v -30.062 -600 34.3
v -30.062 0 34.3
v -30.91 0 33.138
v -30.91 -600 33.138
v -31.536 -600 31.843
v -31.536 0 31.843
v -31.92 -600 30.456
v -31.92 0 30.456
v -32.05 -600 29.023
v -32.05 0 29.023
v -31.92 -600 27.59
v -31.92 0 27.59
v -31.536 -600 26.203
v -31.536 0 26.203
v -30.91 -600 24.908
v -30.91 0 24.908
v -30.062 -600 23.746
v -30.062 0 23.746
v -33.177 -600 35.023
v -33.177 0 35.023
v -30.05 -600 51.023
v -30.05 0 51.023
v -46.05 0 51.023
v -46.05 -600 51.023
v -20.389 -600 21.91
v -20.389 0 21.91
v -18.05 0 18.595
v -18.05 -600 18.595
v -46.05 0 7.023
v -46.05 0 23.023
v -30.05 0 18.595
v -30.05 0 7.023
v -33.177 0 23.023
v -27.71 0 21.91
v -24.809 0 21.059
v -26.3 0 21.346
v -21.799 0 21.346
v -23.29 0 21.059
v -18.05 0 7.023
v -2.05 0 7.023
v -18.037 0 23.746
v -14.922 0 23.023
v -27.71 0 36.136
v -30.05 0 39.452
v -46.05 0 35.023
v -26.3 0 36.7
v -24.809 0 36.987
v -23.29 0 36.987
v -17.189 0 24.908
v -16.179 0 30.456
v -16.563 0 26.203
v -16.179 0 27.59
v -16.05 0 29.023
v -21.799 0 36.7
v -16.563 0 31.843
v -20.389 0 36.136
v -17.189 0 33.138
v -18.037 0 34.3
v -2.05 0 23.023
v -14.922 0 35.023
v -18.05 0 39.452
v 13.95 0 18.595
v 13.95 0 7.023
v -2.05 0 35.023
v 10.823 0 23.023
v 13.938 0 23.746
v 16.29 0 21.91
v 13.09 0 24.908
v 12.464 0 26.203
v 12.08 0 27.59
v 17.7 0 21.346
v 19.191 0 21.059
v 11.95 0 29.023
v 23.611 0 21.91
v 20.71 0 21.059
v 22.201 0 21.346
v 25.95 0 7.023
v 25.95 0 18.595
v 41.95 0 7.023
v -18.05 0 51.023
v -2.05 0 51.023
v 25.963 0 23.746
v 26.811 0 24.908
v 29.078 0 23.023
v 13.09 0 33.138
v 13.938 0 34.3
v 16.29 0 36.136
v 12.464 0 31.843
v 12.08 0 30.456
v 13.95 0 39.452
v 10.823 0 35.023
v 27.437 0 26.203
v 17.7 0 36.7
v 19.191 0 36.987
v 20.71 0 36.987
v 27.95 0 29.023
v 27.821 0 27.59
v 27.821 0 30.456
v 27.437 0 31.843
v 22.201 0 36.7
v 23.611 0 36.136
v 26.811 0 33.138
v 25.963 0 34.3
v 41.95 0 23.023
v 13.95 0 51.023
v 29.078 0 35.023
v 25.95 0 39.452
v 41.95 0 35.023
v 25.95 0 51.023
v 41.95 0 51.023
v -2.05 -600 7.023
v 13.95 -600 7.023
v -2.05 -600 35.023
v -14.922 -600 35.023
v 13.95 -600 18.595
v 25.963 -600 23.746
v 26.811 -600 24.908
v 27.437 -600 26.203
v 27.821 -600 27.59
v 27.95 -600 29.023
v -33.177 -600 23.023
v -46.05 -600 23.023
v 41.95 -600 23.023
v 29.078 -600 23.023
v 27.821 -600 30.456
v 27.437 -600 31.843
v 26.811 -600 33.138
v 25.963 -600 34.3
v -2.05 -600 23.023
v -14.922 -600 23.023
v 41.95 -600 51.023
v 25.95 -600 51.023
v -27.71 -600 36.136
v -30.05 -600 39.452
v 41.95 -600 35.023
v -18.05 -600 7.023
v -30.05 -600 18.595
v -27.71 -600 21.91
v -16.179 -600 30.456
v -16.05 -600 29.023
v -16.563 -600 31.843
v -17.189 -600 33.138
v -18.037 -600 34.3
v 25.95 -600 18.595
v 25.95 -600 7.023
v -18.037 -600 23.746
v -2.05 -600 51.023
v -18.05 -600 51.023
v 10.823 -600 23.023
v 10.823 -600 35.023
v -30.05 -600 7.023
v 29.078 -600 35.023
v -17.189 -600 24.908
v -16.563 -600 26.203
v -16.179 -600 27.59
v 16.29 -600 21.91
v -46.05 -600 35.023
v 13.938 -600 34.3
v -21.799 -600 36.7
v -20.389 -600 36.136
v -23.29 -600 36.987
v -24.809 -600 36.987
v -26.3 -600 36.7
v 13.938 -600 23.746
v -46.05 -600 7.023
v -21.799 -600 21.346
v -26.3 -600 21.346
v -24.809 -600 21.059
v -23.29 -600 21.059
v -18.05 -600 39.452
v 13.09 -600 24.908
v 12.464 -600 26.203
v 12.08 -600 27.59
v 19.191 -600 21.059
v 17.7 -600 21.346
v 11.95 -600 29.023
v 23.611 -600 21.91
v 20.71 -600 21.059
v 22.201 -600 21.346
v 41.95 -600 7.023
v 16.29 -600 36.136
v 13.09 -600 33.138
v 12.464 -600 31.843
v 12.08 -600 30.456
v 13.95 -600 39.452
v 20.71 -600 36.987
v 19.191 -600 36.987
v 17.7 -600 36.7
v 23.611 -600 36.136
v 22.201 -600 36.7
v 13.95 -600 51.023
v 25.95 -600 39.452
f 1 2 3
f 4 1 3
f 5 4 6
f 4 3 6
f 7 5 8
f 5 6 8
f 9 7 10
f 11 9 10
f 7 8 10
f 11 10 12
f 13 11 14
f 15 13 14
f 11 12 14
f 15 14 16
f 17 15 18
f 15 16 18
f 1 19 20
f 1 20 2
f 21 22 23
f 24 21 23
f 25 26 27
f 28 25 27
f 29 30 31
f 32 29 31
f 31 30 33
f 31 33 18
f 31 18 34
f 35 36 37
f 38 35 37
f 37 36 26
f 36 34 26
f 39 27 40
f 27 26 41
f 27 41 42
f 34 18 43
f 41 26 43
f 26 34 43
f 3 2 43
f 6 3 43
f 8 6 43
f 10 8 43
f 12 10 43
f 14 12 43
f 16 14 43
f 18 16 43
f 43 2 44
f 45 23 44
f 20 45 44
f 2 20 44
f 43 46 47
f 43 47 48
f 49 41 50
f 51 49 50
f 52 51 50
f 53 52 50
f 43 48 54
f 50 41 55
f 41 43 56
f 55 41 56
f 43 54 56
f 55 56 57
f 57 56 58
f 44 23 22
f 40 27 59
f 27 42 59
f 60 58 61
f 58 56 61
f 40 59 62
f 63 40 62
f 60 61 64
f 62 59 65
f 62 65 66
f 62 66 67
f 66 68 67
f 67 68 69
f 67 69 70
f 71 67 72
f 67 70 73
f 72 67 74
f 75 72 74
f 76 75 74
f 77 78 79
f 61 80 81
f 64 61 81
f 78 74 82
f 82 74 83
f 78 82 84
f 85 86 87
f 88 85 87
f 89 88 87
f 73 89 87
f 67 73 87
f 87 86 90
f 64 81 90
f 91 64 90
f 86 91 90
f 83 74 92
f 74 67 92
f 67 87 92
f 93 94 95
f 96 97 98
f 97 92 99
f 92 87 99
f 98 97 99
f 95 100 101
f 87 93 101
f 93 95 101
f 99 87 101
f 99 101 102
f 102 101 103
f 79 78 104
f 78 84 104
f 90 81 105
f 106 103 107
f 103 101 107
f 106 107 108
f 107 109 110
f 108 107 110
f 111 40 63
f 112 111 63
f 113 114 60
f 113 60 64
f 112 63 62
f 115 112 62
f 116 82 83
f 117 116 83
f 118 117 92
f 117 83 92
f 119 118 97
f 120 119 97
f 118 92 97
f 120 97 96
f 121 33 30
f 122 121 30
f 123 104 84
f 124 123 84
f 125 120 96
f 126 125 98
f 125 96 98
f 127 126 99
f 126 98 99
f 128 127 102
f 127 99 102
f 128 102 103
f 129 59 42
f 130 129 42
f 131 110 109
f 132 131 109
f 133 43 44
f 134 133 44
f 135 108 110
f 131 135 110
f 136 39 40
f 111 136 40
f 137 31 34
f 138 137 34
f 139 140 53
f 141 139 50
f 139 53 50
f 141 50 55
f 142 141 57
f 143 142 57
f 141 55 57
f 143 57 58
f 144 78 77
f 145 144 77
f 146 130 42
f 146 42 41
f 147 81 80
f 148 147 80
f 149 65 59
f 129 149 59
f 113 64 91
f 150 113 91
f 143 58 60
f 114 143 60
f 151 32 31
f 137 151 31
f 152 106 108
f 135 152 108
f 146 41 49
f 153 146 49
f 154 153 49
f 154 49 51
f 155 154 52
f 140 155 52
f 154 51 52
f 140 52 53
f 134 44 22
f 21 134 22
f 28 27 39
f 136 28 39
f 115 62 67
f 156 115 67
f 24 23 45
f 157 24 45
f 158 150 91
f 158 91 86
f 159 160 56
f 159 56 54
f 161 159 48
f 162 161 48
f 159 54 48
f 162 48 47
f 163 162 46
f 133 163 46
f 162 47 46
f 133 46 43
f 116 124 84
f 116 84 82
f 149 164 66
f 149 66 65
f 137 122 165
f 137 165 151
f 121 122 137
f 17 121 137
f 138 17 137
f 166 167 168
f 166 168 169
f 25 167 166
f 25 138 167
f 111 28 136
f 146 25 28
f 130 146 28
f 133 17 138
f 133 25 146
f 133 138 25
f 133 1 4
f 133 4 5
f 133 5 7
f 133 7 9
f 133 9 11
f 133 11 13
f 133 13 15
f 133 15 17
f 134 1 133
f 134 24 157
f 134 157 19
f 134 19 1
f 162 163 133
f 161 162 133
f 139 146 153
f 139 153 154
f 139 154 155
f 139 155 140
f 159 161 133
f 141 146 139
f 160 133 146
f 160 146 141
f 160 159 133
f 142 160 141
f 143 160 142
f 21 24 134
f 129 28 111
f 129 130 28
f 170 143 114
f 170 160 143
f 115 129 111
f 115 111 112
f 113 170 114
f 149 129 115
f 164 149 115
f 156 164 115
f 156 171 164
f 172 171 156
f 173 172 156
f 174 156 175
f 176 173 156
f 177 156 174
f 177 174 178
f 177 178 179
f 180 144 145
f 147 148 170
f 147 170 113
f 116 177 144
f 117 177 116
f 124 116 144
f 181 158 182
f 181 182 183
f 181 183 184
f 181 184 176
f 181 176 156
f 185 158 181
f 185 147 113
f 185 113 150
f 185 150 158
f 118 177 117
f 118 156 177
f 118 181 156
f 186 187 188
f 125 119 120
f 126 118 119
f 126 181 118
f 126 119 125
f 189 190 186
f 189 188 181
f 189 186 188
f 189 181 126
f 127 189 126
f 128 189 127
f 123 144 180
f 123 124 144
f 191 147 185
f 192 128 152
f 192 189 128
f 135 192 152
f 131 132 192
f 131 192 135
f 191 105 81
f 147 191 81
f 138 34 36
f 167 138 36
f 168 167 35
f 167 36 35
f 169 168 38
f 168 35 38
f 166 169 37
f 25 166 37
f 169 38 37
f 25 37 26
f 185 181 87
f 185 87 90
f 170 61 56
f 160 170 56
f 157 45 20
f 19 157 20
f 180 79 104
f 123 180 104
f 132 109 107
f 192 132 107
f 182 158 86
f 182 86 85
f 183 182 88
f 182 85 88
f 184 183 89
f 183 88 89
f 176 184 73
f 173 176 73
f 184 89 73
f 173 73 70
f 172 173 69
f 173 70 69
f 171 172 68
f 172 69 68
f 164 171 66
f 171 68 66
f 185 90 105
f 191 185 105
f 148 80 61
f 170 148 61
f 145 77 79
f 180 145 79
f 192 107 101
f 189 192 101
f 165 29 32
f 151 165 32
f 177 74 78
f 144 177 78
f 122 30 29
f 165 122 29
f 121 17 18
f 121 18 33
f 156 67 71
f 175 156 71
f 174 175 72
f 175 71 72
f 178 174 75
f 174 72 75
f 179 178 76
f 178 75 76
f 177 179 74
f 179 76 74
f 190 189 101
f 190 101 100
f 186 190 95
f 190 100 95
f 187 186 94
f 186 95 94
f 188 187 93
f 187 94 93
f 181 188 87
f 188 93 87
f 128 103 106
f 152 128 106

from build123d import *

# Parameters (mm, degrees)
F1_DEPTH = 600


# Not quite as in the source:
# - ends of sketch curves that miss each other by under 0.0002 mm in the source are joined


with BuildPart() as f1:
    # F0 (on Front) → F1 (new body)
    with BuildSketch(Plane.XZ):
        with BuildLine():
            Line((25.9504089346, 7.0230446355), (41.9504089346, 7.0230446355))
            Line((41.9504089346, 7.0230446355), (41.9504085783, 23.0230446355))
            Line((41.9504085783, 23.0230446355), (29.0776360335, 23.0230446355))
            Line((29.0776360335, 23.0230446355), (25.9629066643, 23.7457469321))
            ThreePointArc((25.9629066643, 23.7457469321), (24.8732485493, 22.7170435153), (23.6108614125, 21.9096004868))
            Line((23.6108614125, 21.9096004868), (25.9504089346, 18.5945479171))
            Line((25.9504089346, 18.5945479171), (25.9504089346, 7.0230446355))
        make_face()
        with BuildLine():
            ThreePointArc((16.2899564567, 21.9096004868), (19.9504089346, 21.0230446355), (23.6108614125, 21.9096004868))
            ThreePointArc((23.6108614125, 21.9096004868), (24.8732485493, 22.7170435153), (25.9629066643, 23.7457469321))
            ThreePointArc((25.9629066643, 23.7457469321), (27.4370631218, 26.2034685892), (27.9504089346, 29.0230446355))
            ThreePointArc((27.9504089346, 29.0230446355), (27.4370631218, 31.8426206818), (25.9629066643, 34.3003423389))
            ThreePointArc((25.9629066643, 34.3003423389), (24.8732485493, 35.3290457557), (23.6108614125, 36.1364887842))
            ThreePointArc((23.6108614125, 36.1364887842), (19.9504089346, 37.0230446355), (16.2899564567, 36.1364887842))
            ThreePointArc((16.2899564567, 36.1364887842), (15.0275693199, 35.3290457557), (13.9379112049, 34.3003423389))
            ThreePointArc((13.9379112049, 34.3003423389), (11.9504089346, 29.0230446355), (13.9379112049, 23.7457469321))
            ThreePointArc((13.9379112049, 23.7457469321), (15.0275693199, 22.7170435153), (16.2899564567, 21.9096004868))
        make_face()
        with BuildLine():
            Line((13.9504089346, 18.5945479171), (16.2899564567, 21.9096004868))
            ThreePointArc((16.2899564567, 21.9096004868), (15.0275693199, 22.7170435153), (13.9379112049, 23.7457469321))
            Line((13.9379112049, 23.7457469321), (10.8231818357, 23.0230446355))
            Line((10.8231818357, 23.0230446355), (-2.0495907091, 23.0230446355))
            Line((-2.0495907091, 23.0230446355), (-2.0495910654, 7.0230446355))
            Line((-2.0495910654, 7.0230446355), (13.9504089346, 7.0230446355))
            Line((13.9504089346, 7.0230446355), (13.9504089346, 18.5945479171))
        make_face()
        with BuildLine():
            ThreePointArc((23.6108614125, 36.1364887842), (24.8732485493, 35.3290457557), (25.9629066643, 34.3003423389))
            Line((25.9629066643, 34.3003423389), (29.0776360335, 35.0230446355))
            Line((29.0776360335, 35.0230446355), (41.9504085783, 35.0230446355))
            Line((41.9504085783, 35.0230446355), (41.9504089346, 51.0230446355))
            Line((41.9504089346, 51.0230446355), (25.9504089346, 51.0230446355))
            Line((25.9504089346, 51.0230446355), (25.9504089346, 39.4515413539))
            Line((25.9504089346, 39.4515413539), (23.6108614125, 36.1364887842))
        make_face()
        with BuildLine():
            Line((10.8231818357, 35.0230446355), (13.9379112049, 34.3003423389))
            ThreePointArc((13.9379112049, 34.3003423389), (15.0275693199, 35.3290457557), (16.2899564567, 36.1364887842))
            Line((16.2899564567, 36.1364887842), (13.9504089346, 39.4515413539))
            Line((13.9504089346, 39.4515413539), (13.9504089346, 51.0230446355))
            Line((13.9504089346, 51.0230446355), (-2.0495910654, 51.0230446355))
            Line((-2.0495910654, 51.0230446355), (-2.0495907091, 35.0230446355))
            Line((-2.0495907091, 35.0230446355), (10.8231818357, 35.0230446355))
        make_face()
        with BuildLine():
            Line((-2.0495910654, 7.0230446355), (-2.0495907091, 23.0230446355))
            Line((-2.0495907091, 23.0230446355), (-14.9223627195, 23.0230440622))
            Line((-14.9223627195, 23.0230440622), (-18.0370921209, 23.7457462201))
            ThreePointArc((-18.0370921209, 23.7457462201), (-19.1267501901, 22.7170427548), (-20.389137291, 21.90959967))
            Line((-20.389137291, 21.90959967), (-18.0495896212, 18.5945472045))
            Line((-18.0495896212, 18.5945472045), (-18.0495891058, 7.0230439229))
            Line((-18.0495891058, 7.0230439229), (-2.0495910654, 7.0230446355))
        make_face()
        with BuildLine():
            Line((-14.9223632539, 35.0230440622), (-2.0495907091, 35.0230446355))
            Line((-2.0495907091, 35.0230446355), (-2.0495910654, 51.0230446355))
            Line((-2.0495910654, 51.0230446355), (-18.0495910654, 51.0230439229))
            Line((-18.0495910654, 51.0230439229), (-18.0495905501, 39.4515406413))
            Line((-18.0495905501, 39.4515406413), (-20.3891379246, 36.1364879675))
            ThreePointArc((-20.3891379246, 36.1364879675), (-19.1267507518, 35.3290449952), (-18.0370925909, 34.3003416269))
            Line((-18.0370925909, 34.3003416269), (-14.9223632539, 35.0230440622))
        make_face()
        with BuildLine():
            ThreePointArc((-20.389137291, 21.90959967), (-19.1267501901, 22.7170427548), (-18.0370921209, 23.7457462201))
            ThreePointArc((-18.0370921209, 23.7457462201), (-16.5629358356, 26.2034677761), (-16.0495900856, 29.0230436557))
            ThreePointArc((-16.0495900856, 29.0230436557), (-16.5629359612, 31.8426198688), (-18.0370925909, 34.3003416269))
            ThreePointArc((-18.0370925909, 34.3003416269), (-19.1267507518, 35.3290449952), (-20.3891379246, 36.1364879675))
            ThreePointArc((-20.3891379246, 36.1364879675), (-24.0495904419, 37.0230436557), (-27.7100428803, 36.1364876414))
            ThreePointArc((-27.7100428803, 36.1364876414), (-28.9724299811, 35.3290445567), (-30.0620880504, 34.3003410913))
            ThreePointArc((-30.0620880504, 34.3003410913), (-32.0495900856, 29.0230432994), (-30.0620875803, 23.7457456846))
            ThreePointArc((-30.0620875803, 23.7457456846), (-28.9724294195, 22.7170423163), (-27.7100422467, 21.909599344))
            ThreePointArc((-27.7100422467, 21.909599344), (-24.0495897293, 21.0230436557), (-20.389137291, 21.90959967))
        make_face()
        with BuildLine():
            Line((-30.0495896212, 18.5945466701), (-27.7100422467, 21.909599344))
            ThreePointArc((-27.7100422467, 21.909599344), (-28.9724294195, 22.7170423163), (-30.0620875803, 23.7457456846))
            Line((-30.0620875803, 23.7457456846), (-33.1768169173, 23.0230432492))
            Line((-33.1768169173, 23.0230432492), (-46.0495894621, 23.0230426759))
            Line((-46.0495894621, 23.0230426759), (-46.0495891058, 7.0230426759))
            Line((-46.0495891058, 7.0230426759), (-30.0495891058, 7.0230433885))
            Line((-30.0495891058, 7.0230433885), (-30.0495896212, 18.5945466701))
        make_face()
        with BuildLine():
            ThreePointArc((-30.0620880504, 34.3003410913), (-28.9724299811, 35.3290445567), (-27.7100428803, 36.1364876414))
            Line((-27.7100428803, 36.1364876414), (-30.0495905501, 39.4515401069))
            Line((-30.0495905501, 39.4515401069), (-30.0495910654, 51.0230433885))
            Line((-30.0495910654, 51.0230433885), (-46.0495910654, 51.0230426759))
            Line((-46.0495910654, 51.0230426759), (-46.0495899966, 35.0230426759))
            Line((-46.0495899966, 35.0230426759), (-33.1768174518, 35.0230432492))
            Line((-33.1768174518, 35.0230432492), (-30.0620880504, 34.3003410913))
        make_face()
    extrude(amount=F1_DEPTH)


solid = f1.part
